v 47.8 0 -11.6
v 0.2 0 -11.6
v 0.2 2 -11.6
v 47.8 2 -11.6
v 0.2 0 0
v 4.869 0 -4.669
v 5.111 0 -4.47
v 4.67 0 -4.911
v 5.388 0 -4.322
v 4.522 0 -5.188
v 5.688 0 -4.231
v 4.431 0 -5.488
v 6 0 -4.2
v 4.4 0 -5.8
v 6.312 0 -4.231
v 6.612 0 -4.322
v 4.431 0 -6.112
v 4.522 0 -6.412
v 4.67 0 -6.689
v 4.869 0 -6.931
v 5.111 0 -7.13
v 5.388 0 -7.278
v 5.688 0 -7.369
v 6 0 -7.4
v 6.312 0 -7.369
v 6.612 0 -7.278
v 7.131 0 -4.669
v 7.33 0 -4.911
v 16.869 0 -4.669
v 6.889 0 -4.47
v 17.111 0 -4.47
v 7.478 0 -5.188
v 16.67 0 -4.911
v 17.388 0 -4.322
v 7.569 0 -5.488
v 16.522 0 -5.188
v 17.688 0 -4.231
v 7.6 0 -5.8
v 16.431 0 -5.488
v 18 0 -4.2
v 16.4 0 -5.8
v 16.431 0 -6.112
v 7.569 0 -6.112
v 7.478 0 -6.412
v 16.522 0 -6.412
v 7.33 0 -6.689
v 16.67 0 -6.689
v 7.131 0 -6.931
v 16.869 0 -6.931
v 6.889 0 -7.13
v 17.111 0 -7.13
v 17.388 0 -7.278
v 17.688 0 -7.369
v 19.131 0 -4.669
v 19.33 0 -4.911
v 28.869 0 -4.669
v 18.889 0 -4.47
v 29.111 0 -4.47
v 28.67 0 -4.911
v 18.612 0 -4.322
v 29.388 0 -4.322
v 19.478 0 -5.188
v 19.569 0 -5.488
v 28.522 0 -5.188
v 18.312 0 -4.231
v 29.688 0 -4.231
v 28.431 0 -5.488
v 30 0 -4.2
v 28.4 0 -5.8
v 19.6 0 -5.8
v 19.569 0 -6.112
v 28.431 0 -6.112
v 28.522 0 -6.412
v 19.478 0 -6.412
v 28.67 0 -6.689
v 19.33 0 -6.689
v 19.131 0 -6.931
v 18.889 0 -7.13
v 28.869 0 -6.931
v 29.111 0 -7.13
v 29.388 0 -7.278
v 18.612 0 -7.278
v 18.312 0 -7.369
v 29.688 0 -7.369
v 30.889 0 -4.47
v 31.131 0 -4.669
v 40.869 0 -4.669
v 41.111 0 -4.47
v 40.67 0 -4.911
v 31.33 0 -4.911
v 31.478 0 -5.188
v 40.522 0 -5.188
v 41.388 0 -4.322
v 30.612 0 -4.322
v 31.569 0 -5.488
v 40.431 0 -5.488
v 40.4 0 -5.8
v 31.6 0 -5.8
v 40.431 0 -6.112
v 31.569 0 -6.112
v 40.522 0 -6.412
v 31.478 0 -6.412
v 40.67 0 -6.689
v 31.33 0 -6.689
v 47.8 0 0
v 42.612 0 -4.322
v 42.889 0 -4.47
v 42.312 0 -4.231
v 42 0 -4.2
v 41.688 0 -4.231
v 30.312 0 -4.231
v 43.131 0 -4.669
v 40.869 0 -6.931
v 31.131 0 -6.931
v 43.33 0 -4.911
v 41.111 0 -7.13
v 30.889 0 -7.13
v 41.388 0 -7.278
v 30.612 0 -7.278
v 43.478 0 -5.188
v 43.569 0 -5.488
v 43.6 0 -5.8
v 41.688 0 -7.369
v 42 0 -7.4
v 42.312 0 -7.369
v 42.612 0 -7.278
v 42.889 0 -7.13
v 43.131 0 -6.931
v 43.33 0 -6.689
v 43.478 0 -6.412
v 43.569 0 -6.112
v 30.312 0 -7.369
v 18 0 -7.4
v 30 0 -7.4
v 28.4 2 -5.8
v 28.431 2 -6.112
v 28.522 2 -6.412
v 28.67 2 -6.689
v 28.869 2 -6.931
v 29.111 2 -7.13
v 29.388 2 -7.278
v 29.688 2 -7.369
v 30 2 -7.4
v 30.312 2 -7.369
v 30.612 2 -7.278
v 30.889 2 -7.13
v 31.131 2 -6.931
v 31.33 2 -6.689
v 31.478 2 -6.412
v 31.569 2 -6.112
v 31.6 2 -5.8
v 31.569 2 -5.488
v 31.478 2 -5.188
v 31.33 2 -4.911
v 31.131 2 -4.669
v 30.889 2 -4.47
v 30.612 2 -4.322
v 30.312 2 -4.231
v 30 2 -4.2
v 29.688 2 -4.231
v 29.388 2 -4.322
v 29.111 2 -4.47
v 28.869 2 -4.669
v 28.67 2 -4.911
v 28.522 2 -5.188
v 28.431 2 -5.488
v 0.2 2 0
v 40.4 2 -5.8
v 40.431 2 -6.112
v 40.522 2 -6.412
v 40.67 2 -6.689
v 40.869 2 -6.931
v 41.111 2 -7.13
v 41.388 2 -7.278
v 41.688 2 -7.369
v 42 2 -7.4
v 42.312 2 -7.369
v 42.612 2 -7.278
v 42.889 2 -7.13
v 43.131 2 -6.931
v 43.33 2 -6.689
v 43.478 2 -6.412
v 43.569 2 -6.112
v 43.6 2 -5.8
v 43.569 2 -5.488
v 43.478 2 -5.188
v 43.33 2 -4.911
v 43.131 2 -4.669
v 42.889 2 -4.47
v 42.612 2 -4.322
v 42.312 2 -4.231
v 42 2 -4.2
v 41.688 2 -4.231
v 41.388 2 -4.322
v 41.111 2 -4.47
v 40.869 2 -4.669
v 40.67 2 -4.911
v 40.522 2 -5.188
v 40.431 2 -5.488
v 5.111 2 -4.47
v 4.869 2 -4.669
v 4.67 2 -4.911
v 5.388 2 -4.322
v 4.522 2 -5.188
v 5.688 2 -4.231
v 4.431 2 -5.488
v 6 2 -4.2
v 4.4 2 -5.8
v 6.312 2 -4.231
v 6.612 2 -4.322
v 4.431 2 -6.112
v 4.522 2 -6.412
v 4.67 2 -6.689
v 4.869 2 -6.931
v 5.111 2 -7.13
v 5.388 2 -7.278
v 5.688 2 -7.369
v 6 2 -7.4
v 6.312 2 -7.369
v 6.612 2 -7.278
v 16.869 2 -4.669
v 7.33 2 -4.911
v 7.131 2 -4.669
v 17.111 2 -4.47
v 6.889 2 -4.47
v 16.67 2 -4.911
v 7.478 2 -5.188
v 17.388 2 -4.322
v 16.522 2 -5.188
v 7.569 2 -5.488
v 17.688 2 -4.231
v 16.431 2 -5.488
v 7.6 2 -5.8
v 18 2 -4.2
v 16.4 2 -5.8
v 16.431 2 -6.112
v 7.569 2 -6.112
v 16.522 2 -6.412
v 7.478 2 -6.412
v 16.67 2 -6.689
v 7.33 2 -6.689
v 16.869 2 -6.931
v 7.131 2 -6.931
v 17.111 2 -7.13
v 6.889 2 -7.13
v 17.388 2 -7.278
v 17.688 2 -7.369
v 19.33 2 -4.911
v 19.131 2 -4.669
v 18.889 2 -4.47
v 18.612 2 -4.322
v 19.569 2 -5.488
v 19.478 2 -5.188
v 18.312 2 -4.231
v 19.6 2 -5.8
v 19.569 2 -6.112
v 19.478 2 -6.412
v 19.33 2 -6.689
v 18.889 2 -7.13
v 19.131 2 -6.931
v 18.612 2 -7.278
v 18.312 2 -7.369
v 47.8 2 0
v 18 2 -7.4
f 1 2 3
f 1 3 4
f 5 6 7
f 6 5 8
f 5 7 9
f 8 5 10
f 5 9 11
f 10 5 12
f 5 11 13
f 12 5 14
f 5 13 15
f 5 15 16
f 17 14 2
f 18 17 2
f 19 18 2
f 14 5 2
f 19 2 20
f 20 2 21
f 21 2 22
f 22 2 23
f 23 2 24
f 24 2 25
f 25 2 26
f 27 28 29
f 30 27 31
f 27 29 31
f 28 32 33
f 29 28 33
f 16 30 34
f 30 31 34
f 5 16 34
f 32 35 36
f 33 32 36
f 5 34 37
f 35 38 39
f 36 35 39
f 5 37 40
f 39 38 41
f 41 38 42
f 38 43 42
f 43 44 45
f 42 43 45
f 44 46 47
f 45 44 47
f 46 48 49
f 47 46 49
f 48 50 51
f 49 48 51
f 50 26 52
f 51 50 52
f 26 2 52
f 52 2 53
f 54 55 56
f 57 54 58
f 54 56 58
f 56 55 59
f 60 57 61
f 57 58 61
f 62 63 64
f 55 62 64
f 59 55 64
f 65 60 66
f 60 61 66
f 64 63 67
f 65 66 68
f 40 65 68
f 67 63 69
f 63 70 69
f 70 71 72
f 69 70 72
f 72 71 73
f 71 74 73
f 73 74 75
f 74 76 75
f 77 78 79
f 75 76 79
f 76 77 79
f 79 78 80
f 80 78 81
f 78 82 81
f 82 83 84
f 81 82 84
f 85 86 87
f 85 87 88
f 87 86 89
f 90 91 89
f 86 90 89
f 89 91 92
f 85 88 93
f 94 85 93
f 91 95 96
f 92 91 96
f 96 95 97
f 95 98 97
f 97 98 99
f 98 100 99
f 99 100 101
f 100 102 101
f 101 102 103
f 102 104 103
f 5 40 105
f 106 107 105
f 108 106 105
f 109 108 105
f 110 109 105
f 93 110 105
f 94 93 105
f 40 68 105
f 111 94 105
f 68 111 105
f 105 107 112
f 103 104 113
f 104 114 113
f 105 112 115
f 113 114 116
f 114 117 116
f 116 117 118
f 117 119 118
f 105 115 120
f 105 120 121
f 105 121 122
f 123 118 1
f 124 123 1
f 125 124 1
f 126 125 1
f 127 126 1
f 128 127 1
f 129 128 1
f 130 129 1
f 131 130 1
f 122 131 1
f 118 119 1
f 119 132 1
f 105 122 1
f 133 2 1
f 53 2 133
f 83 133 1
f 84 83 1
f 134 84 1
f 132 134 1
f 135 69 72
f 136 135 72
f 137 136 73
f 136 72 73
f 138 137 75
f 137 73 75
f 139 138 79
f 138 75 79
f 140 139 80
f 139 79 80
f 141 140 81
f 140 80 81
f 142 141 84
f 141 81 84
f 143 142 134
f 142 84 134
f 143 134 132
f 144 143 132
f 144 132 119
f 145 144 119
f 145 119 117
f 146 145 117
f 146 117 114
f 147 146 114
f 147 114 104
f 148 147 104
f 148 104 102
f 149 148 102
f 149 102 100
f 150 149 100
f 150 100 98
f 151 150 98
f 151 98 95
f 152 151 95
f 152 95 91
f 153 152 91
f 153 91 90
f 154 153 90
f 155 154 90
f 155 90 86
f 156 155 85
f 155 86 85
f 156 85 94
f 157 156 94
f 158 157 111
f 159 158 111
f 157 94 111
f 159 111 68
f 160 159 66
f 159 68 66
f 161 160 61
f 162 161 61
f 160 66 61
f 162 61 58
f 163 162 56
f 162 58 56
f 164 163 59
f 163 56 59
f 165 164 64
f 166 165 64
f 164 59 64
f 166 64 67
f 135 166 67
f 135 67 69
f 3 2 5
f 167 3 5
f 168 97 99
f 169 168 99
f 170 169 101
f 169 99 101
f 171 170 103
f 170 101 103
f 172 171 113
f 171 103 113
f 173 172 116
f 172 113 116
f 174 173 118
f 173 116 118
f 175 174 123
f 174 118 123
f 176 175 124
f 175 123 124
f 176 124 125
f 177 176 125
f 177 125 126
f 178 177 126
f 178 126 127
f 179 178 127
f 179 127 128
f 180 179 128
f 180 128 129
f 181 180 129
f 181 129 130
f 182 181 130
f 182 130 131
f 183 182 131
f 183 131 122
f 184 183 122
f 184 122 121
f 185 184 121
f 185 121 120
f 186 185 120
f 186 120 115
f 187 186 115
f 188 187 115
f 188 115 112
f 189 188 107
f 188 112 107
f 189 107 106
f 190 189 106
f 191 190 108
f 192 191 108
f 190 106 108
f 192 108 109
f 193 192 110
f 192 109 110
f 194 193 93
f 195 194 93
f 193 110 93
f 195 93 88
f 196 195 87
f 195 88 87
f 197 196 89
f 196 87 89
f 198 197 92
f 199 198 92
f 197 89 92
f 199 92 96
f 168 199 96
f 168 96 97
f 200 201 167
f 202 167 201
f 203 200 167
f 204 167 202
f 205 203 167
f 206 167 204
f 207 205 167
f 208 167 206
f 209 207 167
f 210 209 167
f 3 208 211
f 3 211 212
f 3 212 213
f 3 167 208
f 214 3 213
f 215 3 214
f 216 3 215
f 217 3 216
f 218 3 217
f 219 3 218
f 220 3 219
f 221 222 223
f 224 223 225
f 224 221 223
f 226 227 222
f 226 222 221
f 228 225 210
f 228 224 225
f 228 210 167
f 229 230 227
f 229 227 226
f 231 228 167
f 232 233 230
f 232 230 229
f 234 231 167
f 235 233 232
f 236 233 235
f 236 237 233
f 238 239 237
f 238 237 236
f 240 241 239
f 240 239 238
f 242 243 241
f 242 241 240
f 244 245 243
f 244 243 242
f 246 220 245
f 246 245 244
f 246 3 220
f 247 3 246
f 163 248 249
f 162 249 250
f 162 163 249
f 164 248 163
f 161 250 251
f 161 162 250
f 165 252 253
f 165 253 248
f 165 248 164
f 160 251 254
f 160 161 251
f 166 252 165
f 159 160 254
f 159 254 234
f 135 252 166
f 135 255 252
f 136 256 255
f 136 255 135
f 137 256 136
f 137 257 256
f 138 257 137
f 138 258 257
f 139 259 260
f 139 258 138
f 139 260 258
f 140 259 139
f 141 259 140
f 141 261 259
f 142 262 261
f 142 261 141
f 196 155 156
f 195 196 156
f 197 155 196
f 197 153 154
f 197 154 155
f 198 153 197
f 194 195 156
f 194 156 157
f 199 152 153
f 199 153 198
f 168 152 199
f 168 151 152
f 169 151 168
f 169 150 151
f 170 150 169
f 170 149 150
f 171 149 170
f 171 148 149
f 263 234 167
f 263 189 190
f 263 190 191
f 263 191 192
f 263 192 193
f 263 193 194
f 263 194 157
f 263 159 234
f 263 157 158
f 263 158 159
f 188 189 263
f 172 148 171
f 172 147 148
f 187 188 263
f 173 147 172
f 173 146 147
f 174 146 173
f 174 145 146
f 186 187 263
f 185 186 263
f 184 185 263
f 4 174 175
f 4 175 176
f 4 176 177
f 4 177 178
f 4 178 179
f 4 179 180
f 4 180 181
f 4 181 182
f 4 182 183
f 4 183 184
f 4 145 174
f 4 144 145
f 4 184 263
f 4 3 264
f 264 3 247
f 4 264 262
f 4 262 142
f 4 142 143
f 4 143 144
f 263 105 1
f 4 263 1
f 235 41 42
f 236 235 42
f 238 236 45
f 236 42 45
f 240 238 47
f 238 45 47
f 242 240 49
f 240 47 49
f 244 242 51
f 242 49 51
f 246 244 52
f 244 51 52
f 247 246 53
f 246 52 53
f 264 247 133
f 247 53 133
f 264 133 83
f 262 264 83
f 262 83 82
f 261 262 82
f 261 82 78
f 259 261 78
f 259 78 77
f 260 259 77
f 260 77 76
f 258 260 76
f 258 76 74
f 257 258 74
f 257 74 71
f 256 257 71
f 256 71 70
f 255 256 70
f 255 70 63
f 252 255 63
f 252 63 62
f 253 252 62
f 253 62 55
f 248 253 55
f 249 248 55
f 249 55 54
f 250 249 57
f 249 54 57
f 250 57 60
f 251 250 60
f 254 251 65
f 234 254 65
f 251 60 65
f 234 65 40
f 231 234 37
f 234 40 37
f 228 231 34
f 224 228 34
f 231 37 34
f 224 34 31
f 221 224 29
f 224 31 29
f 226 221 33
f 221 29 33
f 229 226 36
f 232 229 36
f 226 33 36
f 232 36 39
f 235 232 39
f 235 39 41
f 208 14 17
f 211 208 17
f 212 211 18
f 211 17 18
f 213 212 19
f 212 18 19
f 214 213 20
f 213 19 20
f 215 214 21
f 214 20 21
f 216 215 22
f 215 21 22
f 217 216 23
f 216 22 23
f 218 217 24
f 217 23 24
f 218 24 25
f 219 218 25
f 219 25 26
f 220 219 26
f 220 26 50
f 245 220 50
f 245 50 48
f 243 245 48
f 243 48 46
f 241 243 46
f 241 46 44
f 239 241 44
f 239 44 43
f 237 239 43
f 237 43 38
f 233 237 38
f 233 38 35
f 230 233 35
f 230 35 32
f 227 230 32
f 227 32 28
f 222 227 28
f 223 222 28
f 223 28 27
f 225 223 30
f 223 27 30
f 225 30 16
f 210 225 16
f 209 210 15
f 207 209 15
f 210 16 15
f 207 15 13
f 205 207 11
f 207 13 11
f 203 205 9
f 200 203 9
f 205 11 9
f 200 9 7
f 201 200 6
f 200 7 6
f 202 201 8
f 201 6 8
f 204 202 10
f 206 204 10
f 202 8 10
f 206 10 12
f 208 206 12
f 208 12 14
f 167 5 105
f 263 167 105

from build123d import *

# Parameters (mm, degrees)
SKETCH1_W                = 47.6
SKETCH1_H                = 5.8
BOSS_EXTRUDE1_DEPTH      = 2
M3_CLEARANCE_HOLE1_D     = 3.2
M3_CLEARANCE_HOLE1_DEPTH = 3


with BuildPart() as part:
    # Sketch1 → Boss-Extrude1 (new body)
    with BuildSketch(Plane(origin=(0, 0, 0), x_dir=(1, 0, 0), z_dir=(0, 1, 0))):
        with Locations((24, 2.9)):
            Rectangle(SKETCH1_W, SKETCH1_H)
        with Locations((24, 8.7)):
            Rectangle(SKETCH1_W, SKETCH1_H)
    extrude(amount=BOSS_EXTRUDE1_DEPTH)

    # M3 Clearance Hole1
    with Locations(Plane(origin=(0, 2, 0), x_dir=(1, 0, 0), z_dir=(0, 1, 0))):
        with Locations((42, 5.8), (30, 5.8), (18, 5.8), (6, 5.8)):
            Hole(M3_CLEARANCE_HOLE1_D / 2, depth=M3_CLEARANCE_HOLE1_DEPTH)


solid = part.part
